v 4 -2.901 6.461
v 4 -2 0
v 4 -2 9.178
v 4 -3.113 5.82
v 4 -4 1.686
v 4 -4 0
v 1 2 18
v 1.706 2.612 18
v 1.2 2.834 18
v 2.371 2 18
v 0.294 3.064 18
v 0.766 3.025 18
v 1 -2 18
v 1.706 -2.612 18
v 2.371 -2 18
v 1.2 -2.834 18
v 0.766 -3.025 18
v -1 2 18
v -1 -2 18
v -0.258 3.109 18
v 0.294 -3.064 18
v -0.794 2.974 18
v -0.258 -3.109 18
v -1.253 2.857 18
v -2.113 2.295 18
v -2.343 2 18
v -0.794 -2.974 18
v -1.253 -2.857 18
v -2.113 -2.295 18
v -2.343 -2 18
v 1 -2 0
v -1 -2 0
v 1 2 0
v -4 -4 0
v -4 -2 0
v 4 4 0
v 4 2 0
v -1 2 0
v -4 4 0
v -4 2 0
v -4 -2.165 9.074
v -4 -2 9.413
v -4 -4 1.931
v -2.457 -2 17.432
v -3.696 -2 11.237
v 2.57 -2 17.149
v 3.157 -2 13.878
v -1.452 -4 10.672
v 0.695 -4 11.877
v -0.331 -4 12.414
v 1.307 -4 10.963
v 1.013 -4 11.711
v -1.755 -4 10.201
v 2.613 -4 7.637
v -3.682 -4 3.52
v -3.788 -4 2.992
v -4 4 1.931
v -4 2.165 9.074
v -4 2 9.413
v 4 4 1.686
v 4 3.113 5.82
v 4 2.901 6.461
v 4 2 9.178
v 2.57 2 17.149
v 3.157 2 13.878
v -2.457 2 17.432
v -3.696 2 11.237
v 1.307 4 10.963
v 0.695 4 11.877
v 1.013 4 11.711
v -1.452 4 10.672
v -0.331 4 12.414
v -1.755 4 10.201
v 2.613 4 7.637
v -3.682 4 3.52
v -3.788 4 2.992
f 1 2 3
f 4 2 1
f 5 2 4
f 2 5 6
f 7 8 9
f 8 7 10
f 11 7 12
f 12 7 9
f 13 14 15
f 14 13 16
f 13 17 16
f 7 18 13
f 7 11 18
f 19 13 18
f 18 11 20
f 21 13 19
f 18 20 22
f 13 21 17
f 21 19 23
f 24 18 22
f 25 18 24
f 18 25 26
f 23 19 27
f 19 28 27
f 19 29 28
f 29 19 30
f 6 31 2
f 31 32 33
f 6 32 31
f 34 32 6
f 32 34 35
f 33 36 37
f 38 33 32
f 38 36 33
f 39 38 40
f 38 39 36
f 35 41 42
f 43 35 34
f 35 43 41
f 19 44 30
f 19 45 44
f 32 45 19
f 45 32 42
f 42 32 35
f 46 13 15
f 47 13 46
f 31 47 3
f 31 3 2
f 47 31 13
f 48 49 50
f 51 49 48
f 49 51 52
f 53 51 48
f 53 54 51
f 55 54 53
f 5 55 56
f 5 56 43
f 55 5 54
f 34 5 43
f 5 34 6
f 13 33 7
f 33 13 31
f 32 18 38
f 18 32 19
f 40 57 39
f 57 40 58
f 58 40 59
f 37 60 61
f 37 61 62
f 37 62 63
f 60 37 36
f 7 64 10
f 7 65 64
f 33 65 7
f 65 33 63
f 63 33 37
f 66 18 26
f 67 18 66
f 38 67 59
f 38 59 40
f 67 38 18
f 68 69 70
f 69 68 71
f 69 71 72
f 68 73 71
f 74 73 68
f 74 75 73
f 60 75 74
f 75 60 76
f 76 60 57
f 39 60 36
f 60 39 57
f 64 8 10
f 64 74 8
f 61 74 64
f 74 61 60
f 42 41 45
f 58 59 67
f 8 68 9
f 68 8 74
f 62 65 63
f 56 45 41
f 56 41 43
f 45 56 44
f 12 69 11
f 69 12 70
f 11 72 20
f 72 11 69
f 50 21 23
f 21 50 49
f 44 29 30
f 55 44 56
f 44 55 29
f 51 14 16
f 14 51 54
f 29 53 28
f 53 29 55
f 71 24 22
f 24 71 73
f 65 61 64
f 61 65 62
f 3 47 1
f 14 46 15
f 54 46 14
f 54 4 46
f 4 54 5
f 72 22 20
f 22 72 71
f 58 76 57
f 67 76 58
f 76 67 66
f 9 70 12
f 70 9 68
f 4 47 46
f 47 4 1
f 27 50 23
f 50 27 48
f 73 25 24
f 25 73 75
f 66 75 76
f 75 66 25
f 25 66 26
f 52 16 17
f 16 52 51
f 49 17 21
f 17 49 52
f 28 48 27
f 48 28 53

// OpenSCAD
module shit() {translate([-4, 0, 0]) cube([8, 2, 18], center=false);translate([-1, 2, 0]) cube([2, 2, 18], center=false);}


intersection(){
union(){translate([0, -4, 0]) shit();rotate(180, [0,0,1]) translate([0, -4, 0]) shit();}

cylinder(h = 25.0, r1 = 6.0, r2 = 2.0, center = false);}
